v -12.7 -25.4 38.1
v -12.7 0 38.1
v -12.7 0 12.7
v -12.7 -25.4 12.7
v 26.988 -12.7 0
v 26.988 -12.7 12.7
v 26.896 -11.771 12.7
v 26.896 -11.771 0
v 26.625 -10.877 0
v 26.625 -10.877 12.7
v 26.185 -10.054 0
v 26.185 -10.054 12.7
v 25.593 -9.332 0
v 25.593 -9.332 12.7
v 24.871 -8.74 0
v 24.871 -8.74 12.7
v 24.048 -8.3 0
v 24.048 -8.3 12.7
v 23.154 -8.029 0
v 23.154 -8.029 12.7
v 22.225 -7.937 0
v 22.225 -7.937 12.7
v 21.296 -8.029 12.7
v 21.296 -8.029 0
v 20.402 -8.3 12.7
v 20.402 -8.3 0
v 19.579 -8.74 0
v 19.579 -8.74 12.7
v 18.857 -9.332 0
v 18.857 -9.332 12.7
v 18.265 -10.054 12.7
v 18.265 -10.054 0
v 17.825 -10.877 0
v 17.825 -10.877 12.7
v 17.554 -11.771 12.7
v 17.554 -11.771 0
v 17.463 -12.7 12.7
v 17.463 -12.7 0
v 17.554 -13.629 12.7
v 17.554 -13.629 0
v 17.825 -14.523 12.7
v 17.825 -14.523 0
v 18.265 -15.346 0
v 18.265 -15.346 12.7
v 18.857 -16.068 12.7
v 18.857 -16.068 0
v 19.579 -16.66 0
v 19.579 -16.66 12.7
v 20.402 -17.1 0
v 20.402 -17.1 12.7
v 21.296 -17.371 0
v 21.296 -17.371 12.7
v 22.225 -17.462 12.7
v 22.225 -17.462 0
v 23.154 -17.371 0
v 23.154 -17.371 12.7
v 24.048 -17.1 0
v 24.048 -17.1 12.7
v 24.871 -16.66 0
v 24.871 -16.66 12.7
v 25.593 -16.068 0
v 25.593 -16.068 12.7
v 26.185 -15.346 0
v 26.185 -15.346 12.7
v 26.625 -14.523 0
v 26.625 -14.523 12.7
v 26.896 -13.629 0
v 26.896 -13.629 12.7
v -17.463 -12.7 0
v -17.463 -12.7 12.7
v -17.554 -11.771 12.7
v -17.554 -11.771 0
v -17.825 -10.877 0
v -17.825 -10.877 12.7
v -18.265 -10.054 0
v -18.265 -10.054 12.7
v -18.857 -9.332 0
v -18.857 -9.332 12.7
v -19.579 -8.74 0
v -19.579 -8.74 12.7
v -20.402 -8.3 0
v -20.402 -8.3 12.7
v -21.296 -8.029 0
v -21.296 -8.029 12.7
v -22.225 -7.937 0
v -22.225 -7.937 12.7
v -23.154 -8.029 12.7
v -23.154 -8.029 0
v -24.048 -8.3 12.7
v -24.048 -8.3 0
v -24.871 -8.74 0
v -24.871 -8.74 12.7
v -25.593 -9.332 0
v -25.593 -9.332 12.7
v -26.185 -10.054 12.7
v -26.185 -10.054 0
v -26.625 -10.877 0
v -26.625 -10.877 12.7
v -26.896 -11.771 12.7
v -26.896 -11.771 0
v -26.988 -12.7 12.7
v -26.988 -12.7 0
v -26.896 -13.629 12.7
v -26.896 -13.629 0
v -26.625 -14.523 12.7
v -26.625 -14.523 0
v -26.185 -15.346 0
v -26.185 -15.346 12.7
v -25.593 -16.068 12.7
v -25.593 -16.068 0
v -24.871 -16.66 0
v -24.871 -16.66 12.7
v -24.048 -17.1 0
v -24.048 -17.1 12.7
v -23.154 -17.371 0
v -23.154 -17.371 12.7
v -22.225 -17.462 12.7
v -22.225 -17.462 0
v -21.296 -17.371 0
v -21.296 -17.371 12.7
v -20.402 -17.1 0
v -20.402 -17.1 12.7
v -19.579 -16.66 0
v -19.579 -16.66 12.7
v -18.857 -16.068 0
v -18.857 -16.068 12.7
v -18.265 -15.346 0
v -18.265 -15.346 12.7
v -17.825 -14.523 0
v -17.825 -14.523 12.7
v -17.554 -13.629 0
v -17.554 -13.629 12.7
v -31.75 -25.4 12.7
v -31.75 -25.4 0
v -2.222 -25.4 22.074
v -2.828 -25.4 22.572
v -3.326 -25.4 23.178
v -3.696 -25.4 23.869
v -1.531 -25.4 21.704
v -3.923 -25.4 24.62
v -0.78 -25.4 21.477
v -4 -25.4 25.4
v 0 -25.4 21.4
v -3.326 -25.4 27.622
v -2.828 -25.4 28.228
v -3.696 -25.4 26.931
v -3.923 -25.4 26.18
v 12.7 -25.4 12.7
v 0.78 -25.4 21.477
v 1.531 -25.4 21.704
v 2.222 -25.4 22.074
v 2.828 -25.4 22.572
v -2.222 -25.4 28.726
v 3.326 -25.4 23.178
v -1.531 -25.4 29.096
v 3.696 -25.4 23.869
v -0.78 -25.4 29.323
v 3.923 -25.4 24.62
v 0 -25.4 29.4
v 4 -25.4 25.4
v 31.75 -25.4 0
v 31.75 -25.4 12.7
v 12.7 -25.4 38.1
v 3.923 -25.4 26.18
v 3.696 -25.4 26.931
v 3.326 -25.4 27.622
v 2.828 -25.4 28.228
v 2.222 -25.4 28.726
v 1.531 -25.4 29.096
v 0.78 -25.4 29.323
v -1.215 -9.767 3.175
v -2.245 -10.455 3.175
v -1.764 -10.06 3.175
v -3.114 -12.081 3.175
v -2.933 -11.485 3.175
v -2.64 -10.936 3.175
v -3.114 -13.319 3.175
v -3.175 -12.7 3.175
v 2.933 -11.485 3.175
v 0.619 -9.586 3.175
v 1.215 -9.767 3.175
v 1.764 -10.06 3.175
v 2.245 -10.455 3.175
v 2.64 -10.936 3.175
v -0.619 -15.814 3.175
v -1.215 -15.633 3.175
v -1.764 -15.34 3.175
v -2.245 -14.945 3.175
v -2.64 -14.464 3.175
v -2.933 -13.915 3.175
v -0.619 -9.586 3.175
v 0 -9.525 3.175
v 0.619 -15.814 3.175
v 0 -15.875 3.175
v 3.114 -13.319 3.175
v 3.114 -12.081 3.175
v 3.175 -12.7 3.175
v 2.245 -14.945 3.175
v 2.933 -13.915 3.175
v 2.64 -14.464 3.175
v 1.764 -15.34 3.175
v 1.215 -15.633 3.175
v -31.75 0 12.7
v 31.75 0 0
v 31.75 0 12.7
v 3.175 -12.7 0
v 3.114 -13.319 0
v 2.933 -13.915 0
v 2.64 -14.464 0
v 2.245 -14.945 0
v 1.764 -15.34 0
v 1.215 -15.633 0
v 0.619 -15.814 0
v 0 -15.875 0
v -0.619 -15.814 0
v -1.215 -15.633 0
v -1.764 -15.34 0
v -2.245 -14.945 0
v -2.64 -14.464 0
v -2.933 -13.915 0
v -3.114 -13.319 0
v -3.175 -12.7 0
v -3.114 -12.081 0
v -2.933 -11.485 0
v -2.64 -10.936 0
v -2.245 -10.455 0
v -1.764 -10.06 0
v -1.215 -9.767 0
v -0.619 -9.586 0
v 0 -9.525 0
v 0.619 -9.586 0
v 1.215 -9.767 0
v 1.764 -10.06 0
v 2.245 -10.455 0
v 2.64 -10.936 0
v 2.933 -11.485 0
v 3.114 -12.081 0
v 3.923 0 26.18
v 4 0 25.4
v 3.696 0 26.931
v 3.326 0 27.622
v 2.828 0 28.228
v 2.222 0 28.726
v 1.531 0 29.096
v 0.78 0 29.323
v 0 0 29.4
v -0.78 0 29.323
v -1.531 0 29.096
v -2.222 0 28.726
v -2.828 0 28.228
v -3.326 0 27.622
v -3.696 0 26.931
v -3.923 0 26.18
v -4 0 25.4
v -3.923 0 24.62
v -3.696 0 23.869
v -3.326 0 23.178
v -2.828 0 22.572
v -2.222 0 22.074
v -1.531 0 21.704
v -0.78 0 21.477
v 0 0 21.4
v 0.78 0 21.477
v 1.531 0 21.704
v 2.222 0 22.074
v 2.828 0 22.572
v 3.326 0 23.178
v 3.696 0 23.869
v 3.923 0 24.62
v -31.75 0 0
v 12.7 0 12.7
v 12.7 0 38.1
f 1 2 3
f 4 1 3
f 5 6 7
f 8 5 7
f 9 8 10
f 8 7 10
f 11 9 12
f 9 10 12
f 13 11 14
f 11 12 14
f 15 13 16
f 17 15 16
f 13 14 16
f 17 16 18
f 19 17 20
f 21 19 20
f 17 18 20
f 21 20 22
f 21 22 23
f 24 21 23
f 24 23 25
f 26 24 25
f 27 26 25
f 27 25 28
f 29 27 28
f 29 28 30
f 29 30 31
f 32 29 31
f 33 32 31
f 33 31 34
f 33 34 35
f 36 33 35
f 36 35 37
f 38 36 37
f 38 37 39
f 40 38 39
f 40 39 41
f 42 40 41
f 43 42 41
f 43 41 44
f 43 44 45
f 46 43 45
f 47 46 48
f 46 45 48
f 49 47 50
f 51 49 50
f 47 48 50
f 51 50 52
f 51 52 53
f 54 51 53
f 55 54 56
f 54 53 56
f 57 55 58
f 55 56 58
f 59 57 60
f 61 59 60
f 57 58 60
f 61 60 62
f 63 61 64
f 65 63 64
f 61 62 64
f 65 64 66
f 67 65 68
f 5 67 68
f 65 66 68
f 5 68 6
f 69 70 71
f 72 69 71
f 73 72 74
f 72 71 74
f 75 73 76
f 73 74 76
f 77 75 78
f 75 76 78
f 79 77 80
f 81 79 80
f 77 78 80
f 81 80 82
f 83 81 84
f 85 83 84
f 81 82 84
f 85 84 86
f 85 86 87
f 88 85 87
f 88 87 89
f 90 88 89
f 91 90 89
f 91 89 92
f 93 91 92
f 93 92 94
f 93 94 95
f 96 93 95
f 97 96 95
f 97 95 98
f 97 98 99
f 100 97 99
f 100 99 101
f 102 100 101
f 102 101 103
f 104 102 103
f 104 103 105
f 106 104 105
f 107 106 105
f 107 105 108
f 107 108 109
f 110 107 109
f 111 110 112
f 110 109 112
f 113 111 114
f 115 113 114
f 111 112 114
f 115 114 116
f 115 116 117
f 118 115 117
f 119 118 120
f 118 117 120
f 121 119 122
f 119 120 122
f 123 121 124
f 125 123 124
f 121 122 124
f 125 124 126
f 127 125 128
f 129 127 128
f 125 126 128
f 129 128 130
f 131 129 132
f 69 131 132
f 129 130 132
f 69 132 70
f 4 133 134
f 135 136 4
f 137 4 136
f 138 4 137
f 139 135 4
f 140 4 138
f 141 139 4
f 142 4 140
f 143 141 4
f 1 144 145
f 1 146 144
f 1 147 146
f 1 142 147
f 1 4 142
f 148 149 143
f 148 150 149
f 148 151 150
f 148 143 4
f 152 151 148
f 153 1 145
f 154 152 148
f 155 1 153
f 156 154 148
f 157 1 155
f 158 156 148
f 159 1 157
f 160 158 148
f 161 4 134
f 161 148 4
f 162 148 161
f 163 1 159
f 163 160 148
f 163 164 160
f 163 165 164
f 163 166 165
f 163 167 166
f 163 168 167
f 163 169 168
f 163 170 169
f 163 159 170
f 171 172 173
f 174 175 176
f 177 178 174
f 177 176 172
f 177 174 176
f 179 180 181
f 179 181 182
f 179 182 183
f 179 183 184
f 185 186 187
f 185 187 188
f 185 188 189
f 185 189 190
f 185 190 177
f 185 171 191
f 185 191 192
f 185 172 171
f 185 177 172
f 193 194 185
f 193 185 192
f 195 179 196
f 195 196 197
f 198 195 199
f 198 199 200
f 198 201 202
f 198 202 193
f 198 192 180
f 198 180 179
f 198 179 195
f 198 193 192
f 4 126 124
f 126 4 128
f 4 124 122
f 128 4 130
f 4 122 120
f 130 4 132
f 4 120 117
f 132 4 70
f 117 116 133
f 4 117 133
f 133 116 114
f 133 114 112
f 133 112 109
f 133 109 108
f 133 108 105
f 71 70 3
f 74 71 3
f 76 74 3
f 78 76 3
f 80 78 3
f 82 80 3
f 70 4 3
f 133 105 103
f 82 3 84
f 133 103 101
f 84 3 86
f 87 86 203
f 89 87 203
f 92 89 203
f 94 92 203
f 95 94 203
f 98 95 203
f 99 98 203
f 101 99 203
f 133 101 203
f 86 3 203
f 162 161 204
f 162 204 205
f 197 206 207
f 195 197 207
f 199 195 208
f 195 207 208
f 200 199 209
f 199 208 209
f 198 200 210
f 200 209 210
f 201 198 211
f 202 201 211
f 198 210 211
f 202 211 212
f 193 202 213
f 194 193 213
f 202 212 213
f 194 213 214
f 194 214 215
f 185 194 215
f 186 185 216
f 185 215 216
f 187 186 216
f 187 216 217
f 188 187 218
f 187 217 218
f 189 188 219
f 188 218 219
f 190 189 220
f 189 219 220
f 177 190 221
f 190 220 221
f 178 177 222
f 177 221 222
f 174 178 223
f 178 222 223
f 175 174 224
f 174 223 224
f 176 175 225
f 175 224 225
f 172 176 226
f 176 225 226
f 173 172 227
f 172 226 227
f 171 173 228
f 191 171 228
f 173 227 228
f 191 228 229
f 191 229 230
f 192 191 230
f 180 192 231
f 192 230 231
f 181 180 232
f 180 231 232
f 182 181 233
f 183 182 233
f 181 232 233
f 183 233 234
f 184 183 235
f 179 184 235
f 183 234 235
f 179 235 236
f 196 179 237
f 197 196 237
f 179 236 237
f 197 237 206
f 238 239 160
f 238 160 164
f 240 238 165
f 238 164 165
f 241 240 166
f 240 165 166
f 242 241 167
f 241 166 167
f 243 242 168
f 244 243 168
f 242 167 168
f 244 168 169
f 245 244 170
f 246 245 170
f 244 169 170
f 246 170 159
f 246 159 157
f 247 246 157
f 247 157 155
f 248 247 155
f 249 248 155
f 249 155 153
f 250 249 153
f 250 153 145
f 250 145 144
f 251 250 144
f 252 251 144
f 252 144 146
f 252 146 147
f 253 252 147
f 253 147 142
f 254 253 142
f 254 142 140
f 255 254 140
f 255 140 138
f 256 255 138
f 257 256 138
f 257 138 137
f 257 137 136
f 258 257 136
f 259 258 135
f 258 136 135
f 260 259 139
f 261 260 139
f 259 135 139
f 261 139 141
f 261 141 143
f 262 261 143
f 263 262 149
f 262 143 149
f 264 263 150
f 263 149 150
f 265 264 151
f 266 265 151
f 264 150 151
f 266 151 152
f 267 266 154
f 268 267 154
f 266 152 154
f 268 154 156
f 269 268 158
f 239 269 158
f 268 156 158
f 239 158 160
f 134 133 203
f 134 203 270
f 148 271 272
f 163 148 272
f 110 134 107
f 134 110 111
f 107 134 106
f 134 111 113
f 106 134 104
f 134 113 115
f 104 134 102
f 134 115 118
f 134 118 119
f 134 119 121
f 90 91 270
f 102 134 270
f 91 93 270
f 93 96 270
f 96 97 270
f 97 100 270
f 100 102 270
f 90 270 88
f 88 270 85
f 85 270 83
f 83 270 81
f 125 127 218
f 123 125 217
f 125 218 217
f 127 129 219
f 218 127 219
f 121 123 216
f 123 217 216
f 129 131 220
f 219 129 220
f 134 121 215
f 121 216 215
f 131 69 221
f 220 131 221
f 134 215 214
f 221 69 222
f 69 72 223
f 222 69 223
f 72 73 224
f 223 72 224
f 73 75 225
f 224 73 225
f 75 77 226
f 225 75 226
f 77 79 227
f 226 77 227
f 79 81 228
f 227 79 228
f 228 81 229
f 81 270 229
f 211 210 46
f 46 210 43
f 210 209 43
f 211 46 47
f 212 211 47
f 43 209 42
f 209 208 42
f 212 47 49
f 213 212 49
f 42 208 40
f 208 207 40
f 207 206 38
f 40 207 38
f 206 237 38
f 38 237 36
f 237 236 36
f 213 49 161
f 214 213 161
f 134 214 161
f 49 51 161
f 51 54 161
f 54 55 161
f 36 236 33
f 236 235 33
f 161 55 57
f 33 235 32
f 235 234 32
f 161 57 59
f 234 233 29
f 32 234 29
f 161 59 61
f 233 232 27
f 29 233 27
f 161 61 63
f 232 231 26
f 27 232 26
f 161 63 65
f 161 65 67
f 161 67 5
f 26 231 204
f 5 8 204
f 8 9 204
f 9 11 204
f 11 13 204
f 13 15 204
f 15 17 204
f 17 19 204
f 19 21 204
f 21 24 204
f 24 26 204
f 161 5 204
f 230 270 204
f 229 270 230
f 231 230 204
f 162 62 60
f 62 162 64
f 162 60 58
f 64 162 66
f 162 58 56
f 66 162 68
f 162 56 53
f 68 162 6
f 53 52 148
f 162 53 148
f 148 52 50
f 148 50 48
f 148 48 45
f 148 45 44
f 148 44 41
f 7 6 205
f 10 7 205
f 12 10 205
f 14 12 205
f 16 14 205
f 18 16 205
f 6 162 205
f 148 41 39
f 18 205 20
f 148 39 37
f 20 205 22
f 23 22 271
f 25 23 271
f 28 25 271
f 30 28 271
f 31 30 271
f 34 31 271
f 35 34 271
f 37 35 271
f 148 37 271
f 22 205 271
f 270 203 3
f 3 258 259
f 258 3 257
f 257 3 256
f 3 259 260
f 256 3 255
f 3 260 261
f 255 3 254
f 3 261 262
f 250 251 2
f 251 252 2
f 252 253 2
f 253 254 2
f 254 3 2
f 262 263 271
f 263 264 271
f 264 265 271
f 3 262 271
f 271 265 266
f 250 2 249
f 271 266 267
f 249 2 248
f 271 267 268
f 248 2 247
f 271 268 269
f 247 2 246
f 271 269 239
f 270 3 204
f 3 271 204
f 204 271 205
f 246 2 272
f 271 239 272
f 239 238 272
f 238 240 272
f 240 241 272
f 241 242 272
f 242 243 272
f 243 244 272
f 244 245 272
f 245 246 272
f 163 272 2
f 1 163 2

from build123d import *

# Parameters (mm, degrees)
F1_DEPTH = 25.4
F2_R     = 4.7625
F3_DEPTH = 12.701
F4_R     = 4.7625
F5_DEPTH = 12.701
F6_R     = 4
F7_DEPTH = 25.401
F8_R     = 3.175
F9_DEPTH = 3.175


with BuildPart() as f1:
    # F0 (on Front) → F1 (new body)
    with BuildSketch(Plane.XZ):
        Polygon((-31.75, 12.7), (-31.75, 0), (31.75, 0), (31.75, 12.7), (12.7, 12.7), (12.7, 38.1), (-12.7, 38.1), (-12.7, 12.7), align=None)
    extrude(amount=F1_DEPTH)

    # F2 (on face) → F3 (cut, through all)
    with BuildSketch(Plane.XY.offset(12.7)):
        with Locations((-22.225, -12.7)):
            Circle(F2_R)
    extrude(amount=-F3_DEPTH, mode=Mode.SUBTRACT)

    # F4 (on face) → F5 (cut, through all)
    with BuildSketch(Plane.XY.offset(12.7)):
        with Locations((22.225, -12.7)):
            Circle(F4_R)
    extrude(amount=-F5_DEPTH, mode=Mode.SUBTRACT)

    # F6 (on face) → F7 (cut, through all)
    with BuildSketch(Plane.XZ.offset(25.4)):
        with Locations((0, 25.4)):
            Circle(F6_R)
    extrude(amount=-F7_DEPTH, mode=Mode.SUBTRACT)

    # F8 (on face) → F9 (cut)
    with BuildSketch(Plane(origin=(0, 0, 0), x_dir=(1, 0, 0), z_dir=(0, 0, -1))):
        with Locations((0, 12.7)):
            Circle(F8_R)
    extrude(amount=-F9_DEPTH, mode=Mode.SUBTRACT)


solid = f1.part
